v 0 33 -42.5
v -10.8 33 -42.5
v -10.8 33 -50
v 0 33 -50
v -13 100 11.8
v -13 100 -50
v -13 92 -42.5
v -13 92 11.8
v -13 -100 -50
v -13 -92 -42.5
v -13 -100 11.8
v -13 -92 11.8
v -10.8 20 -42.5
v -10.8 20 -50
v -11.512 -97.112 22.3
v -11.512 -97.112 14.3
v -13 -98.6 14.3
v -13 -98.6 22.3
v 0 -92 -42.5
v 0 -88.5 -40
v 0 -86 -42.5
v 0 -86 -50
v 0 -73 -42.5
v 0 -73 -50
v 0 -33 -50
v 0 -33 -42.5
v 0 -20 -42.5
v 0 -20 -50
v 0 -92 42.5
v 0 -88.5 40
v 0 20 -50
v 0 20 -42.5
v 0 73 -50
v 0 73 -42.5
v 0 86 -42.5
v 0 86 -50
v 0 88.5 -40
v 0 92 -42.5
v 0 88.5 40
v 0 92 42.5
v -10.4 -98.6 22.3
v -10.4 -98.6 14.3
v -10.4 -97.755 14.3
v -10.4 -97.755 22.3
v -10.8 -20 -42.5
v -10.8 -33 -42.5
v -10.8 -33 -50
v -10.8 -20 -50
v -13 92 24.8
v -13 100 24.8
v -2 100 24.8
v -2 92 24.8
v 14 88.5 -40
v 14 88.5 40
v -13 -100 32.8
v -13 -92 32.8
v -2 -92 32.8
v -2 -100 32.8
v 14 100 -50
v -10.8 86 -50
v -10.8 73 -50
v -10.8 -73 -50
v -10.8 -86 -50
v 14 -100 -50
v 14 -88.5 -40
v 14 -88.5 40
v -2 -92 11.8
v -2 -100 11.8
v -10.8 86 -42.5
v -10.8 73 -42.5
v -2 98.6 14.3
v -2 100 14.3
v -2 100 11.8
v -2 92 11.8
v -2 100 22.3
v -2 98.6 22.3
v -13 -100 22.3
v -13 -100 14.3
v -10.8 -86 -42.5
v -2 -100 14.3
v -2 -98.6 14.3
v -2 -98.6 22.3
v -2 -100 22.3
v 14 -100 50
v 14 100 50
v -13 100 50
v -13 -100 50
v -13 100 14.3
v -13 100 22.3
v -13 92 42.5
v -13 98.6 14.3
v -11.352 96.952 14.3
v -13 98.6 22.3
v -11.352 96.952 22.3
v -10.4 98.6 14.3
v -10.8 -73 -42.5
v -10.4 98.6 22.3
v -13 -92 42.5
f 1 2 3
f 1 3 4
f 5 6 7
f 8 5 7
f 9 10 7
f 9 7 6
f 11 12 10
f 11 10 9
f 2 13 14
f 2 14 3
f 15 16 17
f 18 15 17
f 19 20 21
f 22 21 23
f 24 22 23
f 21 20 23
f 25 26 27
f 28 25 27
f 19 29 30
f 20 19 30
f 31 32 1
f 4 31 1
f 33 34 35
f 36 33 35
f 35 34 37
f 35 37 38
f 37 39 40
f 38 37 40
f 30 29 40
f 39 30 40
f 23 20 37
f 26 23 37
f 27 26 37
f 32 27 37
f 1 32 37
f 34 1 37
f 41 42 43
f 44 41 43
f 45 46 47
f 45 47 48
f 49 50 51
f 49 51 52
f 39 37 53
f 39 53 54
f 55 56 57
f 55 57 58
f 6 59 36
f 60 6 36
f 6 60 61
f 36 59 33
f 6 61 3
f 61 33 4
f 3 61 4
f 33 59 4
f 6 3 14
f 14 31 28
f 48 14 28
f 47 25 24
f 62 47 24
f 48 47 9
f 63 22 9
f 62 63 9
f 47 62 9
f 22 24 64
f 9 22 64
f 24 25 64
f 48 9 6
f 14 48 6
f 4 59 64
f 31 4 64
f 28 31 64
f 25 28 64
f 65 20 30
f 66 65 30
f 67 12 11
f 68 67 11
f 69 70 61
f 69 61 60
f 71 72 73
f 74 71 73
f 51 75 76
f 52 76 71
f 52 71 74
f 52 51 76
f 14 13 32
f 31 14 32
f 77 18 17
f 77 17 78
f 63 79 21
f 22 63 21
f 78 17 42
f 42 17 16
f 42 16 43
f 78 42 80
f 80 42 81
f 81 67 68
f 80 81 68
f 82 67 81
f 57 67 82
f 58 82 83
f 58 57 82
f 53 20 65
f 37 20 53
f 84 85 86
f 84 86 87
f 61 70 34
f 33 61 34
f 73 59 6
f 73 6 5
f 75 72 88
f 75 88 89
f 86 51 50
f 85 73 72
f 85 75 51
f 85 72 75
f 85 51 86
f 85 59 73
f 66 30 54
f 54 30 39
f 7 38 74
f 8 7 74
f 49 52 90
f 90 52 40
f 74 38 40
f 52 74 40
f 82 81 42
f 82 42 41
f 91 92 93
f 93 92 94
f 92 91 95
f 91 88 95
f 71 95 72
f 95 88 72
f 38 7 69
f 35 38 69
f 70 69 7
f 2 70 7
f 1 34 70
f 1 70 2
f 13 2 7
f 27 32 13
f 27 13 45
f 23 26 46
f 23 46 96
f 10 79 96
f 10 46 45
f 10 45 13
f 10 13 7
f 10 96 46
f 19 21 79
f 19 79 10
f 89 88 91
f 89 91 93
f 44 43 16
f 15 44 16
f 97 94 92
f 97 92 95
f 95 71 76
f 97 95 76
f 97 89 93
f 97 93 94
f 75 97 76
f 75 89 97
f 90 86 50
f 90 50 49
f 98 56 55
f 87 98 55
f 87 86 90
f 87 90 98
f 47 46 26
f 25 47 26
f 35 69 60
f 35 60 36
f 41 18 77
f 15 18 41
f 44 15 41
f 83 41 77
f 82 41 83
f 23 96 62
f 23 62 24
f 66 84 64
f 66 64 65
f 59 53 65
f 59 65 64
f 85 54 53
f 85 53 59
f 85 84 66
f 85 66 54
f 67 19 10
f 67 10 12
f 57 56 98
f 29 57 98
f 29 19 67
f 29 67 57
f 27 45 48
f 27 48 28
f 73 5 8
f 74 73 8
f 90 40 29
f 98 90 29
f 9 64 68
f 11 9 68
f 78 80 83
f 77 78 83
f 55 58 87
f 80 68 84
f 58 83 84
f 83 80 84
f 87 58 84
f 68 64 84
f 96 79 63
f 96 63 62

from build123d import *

# Parameters (mm, degrees)
SKETCH1_W           = 200
SKETCH1_H           = 100
SKETCH1_W_2         = 177
SKETCH1_H_2         = 80
BOSS_EXTRUDE1_DEPTH = 14
SKETCH2_W           = 200
SKETCH2_H           = 100
SKETCH2_W_2         = 184
SKETCH2_H_2         = 85
BOSS_EXTRUDE2_DEPTH = 13
SKETCH4_W           = 10.8
SKETCH4_H           = 13
CUT_EXTRUDE2_DEPTH  = 137.938854968
SKETCH5_W           = 8
SKETCH5_H           = 13
SKETCH5_H_2         = 21
CUT_EXTRUDE3_DEPTH  = 11
SKETCH7_W           = 1.4
SKETCH7_H           = 8
BOSS_EXTRUDE3_DEPTH = 11
SKETCH8_W           = 2.6
SKETCH8_H           = 8
BOSS_EXTRUDE4_DEPTH = 2
CHAMFER3_SIZE       = 2
CHAMFER4_SIZE       = 1.154700538
CHAMFER4_SIZE_2     = 2
MIRROR2_START       = 14.3
MIRROR2_DEPTH       = 8


# Read off the part's stored shape, not the designer's step: Mirror2
with BuildPart() as part:
    # Sketch1 → Boss-Extrude1 (new body)
    with BuildSketch(Plane.YZ):
        Rectangle(SKETCH1_W, SKETCH1_H)
        Rectangle(SKETCH1_W_2, SKETCH1_H_2, mode=Mode.SUBTRACT)
    extrude(amount=BOSS_EXTRUDE1_DEPTH)

    # Sketch2 → Boss-Extrude2 (add)
    with BuildSketch(Plane(origin=(0, 0, 0), x_dir=(0, -1, 0), z_dir=(-1, 0, 0))):
        Rectangle(SKETCH2_W, SKETCH2_H)
        Rectangle(SKETCH2_W_2, SKETCH2_H_2, mode=Mode.SUBTRACT)
    extrude(amount=BOSS_EXTRUDE2_DEPTH)

    # Sketch4 → Cut-Extrude2 (cut, through all)
    with BuildSketch(Plane.XY.offset(-42.5)):
        with Locations((-5.4, 79.5)):
            Rectangle(SKETCH4_W, SKETCH4_H)
        with Locations((-5.4, 26.5)):
            Rectangle(SKETCH4_W, SKETCH4_H)
        with Locations((-5.4, -26.5)):
            Rectangle(SKETCH4_W, SKETCH4_H)
        with Locations((-5.4, -79.5)):
            Rectangle(SKETCH4_W, SKETCH4_H)
    extrude(amount=-CUT_EXTRUDE2_DEPTH, mode=Mode.SUBTRACT)

    # Sketch5 → Cut-Extrude3 (cut)
    with BuildSketch(Plane(origin=(-13, 0, 0), x_dir=(0, -1, 0), z_dir=(-1, 0, 0))):
        with Locations((-96, 18.3)):
            Rectangle(SKETCH5_W, SKETCH5_H)
        with Locations((96, 22.3)):
            Rectangle(SKETCH5_W, SKETCH5_H_2)
    extrude(amount=-CUT_EXTRUDE3_DEPTH, mode=Mode.SUBTRACT)

    # Sketch7 → Boss-Extrude3 (add)
    with BuildSketch(Plane(origin=(-2, 0, 0), x_dir=(0, -1, 0), z_dir=(-1, 0, 0))):
        with Locations((-99.3, 18.3)):
            Rectangle(SKETCH7_W, SKETCH7_H)
        with Locations((99.3, 18.3)):
            Rectangle(SKETCH7_W, SKETCH7_H)
    extrude(amount=BOSS_EXTRUDE3_DEPTH)

    # Sketch8 → Boss-Extrude4 (add)
    with BuildSketch(Plane.XZ.offset(-98.6)):
        with Locations((-11.7, 18.3)):
            Rectangle(SKETCH8_W, SKETCH8_H)
    extrude(amount=BOSS_EXTRUDE4_DEPTH)

    # Chamfer3
    chamfer3_edges = [part.edges().sort_by_distance(p)[0] for p in [
        (-13, 96.6, 18.3),
    ]]
    chamfer(chamfer3_edges, length=CHAMFER3_SIZE)

    # Chamfer4
    # the kernel refuses this chamfer: 2, 1.154700538 mm, written as the material it takes off along each edge
    with BuildSketch(Plane(origin=(-10.4, 96.6, 27.474171509), x_dir=(-0.9983227437537927, -0.057893862402668146, 0), z_dir=(0, 0, -1))) as chamfer4_piece_1_section:
        Polygon((CHAMFER4_SIZE * 0.998322744082, CHAMFER4_SIZE * 0.0578938624217), (-CHAMFER4_SIZE_2 * 0.0578938624027, CHAMFER4_SIZE_2 * 0.998322743754), (0, 0), align=None)
    chamfer4_piece_1 = extrude(amount=18.348343019, mode=Mode.PRIVATE)
    chamfer4_piece_1 = split(chamfer4_piece_1, bisect_by=Plane(origin=(-10.737181007, 97.317358716, 24.8), z_dir=(0, 0, -1)), keep=Keep.TOP, mode=Mode.PRIVATE)
    chamfer4_piece_1 = split(chamfer4_piece_1, bisect_by=Plane(origin=(-10.737181007, 97.317358716, 11.8), z_dir=(0, 0, 1)), keep=Keep.TOP, mode=Mode.PRIVATE)
    add(chamfer4_piece_1, mode=Mode.SUBTRACT)

    # Mirror2 outline → Mirror2 (add)
    with BuildSketch(Plane.XY.offset(MIRROR2_START)):
        Polygon((-13, -98.6), (-10.4, -98.6), (-10.4, -97.754700538), (-11.512435565, -97.112435565), align=None)
    extrude(amount=MIRROR2_DEPTH)


solid = part.part
